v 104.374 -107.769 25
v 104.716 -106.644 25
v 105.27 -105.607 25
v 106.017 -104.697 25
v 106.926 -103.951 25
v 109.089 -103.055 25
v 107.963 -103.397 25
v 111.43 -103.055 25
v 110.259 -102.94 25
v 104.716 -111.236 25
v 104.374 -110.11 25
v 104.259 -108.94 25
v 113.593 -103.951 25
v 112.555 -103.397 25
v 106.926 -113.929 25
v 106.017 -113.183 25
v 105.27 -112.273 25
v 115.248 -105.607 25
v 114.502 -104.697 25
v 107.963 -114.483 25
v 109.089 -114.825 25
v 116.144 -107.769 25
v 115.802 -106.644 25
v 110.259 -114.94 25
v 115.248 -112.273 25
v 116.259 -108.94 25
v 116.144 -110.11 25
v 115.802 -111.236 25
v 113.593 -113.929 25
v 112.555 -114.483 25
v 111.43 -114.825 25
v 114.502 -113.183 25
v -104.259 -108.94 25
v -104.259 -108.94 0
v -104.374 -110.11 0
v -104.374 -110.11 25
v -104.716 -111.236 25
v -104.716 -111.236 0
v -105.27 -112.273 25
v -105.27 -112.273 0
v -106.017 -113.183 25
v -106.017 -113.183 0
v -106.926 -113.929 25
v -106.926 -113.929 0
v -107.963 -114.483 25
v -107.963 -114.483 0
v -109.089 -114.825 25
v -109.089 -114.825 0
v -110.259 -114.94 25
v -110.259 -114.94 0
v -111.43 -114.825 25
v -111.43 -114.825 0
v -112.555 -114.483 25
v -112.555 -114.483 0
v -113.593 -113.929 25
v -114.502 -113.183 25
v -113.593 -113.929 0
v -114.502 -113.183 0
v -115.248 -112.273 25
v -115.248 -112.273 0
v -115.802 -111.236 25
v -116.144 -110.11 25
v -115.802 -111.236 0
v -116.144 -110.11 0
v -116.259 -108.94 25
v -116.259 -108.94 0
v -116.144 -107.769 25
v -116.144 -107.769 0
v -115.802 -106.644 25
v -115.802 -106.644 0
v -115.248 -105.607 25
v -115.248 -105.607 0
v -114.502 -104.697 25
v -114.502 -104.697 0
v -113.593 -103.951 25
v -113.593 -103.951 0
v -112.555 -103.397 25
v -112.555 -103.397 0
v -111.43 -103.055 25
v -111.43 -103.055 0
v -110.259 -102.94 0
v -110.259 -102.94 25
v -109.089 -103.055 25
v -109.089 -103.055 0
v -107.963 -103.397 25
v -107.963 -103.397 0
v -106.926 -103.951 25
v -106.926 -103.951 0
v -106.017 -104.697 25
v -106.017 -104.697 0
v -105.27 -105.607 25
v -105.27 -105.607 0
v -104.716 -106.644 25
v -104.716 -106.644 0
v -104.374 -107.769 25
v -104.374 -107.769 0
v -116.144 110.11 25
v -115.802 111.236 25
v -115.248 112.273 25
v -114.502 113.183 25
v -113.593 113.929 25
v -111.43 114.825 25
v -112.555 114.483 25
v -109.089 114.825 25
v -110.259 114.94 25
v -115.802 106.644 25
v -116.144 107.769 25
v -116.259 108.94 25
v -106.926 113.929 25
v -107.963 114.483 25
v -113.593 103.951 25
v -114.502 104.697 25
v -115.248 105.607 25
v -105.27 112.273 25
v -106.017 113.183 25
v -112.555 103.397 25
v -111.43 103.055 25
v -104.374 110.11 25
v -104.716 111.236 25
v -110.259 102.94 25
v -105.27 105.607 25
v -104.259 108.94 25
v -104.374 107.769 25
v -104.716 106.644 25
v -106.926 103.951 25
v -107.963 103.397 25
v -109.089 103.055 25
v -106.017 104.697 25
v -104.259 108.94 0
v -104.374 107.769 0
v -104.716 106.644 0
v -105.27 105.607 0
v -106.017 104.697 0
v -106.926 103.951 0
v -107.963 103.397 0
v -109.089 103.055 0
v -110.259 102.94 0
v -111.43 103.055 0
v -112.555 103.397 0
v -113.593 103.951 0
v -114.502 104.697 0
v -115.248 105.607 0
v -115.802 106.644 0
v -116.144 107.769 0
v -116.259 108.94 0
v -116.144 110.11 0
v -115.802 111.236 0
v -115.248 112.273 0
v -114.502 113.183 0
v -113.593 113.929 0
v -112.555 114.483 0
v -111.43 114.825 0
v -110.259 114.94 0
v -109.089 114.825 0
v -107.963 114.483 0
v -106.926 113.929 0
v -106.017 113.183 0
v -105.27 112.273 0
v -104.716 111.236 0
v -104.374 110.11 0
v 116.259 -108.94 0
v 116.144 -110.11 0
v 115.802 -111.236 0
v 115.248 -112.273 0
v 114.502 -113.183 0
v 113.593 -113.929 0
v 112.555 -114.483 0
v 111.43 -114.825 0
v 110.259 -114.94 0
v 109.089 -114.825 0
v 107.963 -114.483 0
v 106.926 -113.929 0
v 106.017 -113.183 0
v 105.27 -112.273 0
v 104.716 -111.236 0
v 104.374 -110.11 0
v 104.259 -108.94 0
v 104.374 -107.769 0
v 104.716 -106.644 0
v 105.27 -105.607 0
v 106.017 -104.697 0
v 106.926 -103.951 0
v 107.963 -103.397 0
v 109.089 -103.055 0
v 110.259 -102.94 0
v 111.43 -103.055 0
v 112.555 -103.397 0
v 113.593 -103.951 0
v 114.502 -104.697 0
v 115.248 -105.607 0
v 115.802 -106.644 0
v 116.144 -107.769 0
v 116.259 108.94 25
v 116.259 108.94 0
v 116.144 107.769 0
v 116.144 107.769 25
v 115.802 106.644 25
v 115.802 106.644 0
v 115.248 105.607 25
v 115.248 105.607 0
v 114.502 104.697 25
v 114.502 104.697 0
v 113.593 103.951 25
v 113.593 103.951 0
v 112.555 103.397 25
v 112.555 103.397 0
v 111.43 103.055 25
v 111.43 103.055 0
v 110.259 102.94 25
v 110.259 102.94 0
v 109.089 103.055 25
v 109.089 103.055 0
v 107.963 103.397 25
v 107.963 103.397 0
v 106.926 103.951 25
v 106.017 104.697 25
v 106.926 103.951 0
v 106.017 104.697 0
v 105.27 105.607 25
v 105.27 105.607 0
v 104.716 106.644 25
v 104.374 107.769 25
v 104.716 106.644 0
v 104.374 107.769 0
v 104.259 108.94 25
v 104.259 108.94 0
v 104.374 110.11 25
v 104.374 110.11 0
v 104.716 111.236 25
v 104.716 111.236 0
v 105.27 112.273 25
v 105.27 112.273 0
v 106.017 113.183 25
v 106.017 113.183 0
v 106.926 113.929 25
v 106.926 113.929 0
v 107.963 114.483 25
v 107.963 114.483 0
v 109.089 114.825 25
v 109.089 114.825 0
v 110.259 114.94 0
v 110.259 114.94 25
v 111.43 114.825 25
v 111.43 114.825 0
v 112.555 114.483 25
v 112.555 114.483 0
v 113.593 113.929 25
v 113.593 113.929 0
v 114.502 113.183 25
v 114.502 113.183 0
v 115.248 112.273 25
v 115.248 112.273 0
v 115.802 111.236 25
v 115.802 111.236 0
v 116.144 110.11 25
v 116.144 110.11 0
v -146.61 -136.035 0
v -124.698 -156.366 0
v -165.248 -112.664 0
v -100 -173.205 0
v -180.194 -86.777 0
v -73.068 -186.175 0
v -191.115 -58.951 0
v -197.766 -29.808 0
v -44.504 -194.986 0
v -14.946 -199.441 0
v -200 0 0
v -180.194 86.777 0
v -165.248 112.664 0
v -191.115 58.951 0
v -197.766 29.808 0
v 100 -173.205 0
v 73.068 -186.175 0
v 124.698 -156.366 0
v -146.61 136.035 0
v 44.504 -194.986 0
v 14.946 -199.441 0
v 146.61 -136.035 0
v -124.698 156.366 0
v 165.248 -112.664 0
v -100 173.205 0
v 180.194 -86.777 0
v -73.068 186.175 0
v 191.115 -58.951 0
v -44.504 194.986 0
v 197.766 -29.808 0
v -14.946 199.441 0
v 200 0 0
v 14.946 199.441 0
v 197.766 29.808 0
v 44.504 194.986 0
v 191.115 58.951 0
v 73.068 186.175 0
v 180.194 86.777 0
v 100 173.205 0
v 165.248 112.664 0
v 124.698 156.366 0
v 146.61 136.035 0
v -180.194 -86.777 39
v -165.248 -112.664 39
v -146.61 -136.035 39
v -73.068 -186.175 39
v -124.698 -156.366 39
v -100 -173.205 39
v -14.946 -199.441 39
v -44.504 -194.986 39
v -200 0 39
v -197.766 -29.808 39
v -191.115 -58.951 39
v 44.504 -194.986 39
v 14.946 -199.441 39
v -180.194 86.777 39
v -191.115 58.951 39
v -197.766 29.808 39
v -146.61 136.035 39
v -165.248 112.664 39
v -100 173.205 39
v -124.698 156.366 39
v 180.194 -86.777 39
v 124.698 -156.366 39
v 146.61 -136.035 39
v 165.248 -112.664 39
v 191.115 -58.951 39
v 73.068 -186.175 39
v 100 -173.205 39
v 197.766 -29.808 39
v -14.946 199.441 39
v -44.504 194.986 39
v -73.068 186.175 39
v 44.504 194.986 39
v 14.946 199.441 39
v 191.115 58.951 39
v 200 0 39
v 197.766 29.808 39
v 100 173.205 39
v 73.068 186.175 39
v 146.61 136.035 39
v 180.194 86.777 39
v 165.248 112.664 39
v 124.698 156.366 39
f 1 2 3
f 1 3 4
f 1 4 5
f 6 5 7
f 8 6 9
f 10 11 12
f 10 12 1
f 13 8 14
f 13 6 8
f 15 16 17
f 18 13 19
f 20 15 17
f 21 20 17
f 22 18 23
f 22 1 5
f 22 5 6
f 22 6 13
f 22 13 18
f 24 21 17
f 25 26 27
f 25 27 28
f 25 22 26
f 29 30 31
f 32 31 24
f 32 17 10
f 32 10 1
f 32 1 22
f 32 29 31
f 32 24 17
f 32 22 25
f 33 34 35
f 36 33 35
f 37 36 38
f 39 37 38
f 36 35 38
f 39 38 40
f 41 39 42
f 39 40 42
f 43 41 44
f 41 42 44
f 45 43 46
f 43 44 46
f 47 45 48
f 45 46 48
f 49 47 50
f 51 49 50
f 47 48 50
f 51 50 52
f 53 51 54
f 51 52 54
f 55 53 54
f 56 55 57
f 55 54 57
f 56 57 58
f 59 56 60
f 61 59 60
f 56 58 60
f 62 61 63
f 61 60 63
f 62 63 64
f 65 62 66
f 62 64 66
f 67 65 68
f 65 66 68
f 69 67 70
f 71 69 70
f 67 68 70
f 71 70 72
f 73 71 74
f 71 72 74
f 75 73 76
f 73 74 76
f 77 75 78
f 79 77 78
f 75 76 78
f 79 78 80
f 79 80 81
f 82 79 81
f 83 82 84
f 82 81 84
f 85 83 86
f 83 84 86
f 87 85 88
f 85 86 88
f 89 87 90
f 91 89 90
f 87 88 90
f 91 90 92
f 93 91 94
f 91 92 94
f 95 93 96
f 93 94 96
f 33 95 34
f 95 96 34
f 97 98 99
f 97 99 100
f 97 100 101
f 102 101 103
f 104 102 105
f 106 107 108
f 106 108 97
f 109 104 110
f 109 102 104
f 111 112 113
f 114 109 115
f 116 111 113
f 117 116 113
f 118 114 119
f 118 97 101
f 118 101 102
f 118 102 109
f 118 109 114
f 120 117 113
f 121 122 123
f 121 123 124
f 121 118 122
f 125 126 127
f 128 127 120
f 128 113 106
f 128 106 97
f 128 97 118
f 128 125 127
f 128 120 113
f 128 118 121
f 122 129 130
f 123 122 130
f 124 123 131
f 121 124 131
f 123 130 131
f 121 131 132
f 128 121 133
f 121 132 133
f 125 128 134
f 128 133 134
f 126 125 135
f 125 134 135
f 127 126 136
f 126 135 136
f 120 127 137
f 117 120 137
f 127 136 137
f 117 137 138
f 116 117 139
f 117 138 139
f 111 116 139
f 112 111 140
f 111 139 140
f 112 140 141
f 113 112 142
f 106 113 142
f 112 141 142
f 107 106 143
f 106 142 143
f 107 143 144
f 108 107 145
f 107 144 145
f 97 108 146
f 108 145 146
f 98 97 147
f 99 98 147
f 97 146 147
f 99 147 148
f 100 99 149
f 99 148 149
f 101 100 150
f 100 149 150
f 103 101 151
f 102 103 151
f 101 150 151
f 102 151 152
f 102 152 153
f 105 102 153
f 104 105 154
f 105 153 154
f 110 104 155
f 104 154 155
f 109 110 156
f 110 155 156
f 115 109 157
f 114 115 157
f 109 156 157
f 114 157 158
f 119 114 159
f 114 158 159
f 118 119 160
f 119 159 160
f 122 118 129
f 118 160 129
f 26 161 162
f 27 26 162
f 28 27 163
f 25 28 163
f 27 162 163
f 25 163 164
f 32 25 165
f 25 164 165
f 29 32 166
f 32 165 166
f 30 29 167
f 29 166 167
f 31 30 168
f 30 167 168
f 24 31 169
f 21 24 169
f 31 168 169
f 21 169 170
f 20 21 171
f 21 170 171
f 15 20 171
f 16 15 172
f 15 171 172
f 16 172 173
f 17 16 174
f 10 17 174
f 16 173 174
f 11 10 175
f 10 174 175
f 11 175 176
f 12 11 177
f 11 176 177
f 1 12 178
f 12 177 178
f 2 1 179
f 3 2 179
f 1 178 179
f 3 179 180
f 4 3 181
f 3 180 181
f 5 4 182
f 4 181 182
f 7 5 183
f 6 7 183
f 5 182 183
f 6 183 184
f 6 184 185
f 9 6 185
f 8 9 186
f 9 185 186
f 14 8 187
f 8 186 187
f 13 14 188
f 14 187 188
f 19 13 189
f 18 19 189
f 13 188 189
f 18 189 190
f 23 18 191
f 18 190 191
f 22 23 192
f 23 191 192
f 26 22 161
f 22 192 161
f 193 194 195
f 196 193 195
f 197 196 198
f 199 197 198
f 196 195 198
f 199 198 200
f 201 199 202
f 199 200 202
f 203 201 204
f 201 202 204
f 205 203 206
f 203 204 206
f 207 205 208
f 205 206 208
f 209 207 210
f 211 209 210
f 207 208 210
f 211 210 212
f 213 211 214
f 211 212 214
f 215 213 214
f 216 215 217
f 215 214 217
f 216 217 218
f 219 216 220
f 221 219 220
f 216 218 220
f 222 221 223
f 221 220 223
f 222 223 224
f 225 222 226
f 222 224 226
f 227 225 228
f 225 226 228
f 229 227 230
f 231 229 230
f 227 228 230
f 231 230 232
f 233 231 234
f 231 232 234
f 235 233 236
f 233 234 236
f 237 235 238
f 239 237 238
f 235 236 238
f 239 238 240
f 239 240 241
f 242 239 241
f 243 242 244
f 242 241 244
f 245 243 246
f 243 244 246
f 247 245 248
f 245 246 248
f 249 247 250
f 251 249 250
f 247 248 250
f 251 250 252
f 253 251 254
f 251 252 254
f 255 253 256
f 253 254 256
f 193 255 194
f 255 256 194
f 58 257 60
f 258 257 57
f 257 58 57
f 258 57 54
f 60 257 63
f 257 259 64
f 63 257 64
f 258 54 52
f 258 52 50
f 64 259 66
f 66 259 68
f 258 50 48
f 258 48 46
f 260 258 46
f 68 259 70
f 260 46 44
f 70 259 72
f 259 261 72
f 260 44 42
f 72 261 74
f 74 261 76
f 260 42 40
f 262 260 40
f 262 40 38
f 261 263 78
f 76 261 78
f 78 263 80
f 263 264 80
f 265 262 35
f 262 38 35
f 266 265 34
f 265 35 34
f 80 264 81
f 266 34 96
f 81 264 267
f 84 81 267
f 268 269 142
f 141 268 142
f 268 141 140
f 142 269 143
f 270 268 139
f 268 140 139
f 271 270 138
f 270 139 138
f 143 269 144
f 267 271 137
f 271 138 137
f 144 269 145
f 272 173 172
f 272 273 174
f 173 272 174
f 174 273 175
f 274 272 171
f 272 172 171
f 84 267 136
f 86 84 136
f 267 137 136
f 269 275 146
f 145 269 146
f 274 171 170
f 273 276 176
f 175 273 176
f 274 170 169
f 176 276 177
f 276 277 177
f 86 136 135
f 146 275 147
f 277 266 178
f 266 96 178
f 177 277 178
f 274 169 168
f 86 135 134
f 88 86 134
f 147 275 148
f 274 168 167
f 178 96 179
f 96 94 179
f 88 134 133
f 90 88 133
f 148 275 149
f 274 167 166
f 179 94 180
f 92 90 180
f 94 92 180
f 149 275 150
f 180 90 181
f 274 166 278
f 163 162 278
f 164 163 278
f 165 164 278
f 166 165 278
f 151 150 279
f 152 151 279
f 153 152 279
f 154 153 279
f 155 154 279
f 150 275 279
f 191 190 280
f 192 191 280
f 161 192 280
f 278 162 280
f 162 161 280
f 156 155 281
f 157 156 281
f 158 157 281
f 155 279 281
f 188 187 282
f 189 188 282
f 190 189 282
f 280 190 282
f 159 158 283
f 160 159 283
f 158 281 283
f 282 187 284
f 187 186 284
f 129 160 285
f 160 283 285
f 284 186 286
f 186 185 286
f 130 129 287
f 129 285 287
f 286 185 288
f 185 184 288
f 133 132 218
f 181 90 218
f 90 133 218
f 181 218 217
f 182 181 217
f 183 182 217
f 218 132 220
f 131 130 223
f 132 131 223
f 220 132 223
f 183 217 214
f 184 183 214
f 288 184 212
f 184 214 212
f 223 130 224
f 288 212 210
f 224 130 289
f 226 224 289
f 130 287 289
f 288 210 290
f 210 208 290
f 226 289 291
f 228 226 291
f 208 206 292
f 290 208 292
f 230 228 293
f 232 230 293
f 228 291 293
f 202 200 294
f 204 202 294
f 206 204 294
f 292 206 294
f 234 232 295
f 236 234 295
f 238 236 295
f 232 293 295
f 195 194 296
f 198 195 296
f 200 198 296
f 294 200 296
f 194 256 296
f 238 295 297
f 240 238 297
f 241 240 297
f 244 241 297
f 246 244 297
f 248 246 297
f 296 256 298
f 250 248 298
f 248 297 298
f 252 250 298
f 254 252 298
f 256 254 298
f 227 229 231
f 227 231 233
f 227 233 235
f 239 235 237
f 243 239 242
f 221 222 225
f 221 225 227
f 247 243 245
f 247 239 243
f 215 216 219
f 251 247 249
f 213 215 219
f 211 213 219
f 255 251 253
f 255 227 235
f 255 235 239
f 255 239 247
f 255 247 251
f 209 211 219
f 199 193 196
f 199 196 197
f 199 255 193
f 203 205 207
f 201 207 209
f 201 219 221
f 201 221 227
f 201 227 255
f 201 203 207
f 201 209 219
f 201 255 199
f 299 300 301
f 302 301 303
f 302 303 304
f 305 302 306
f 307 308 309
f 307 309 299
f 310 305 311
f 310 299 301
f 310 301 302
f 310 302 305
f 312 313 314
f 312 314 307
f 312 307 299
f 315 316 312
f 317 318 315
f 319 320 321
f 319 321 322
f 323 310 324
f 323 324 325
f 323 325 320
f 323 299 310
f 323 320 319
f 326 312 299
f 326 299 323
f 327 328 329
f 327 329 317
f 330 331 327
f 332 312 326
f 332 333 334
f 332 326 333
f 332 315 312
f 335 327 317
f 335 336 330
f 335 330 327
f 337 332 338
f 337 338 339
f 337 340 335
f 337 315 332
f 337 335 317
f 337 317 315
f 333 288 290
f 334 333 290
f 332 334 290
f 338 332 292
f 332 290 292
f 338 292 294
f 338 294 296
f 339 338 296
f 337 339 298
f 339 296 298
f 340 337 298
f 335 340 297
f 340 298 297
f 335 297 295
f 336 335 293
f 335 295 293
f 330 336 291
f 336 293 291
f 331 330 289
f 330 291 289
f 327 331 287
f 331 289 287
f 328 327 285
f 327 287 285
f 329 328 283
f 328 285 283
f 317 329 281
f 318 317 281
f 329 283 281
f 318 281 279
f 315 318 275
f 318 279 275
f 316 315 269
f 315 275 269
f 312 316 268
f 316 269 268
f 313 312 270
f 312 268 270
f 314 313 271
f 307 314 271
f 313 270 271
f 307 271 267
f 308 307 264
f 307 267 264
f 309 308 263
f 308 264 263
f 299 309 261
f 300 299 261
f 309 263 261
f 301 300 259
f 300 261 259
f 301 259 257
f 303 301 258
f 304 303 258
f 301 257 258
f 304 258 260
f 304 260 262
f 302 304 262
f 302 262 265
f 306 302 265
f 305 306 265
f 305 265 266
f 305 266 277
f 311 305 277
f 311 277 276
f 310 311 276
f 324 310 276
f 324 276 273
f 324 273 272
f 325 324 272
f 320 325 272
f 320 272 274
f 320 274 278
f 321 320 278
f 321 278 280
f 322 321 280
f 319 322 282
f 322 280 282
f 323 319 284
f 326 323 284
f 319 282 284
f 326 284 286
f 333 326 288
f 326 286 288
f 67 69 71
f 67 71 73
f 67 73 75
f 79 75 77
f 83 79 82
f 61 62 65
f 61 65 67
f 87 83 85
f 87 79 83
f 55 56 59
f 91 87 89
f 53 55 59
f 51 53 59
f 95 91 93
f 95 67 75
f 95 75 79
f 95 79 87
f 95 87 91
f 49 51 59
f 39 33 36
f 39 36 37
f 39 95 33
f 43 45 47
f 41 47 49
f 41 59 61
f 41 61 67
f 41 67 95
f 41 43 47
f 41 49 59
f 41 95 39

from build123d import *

# Parameters (mm, degrees)
F0_R     = 200
F1_DEPTH = 39
F2_R     = 6
F3_DEPTH = 25


with BuildPart() as f1:
    # F0 (on Top) → F1 (new body)
    with BuildSketch(Plane.XY):
        Circle(F0_R)
    extrude(amount=F1_DEPTH)

    # F2 (on face) → F3 (cut)
    with BuildSketch(Plane(origin=(0, 0, 0), x_dir=(1, 0, 0), z_dir=(0, 0, -1))):
        with Locations((110.25921, 108.939922)):
            Circle(F2_R)
        with Locations((110.25921, -108.939922)):
            Circle(F2_R)
        with Locations((-110.25921, -108.939922)):
            Circle(F2_R)
        with Locations((-110.25921, 108.939922)):
            Circle(F2_R)
    extrude(amount=-F3_DEPTH, mode=Mode.SUBTRACT)


solid = f1.part
